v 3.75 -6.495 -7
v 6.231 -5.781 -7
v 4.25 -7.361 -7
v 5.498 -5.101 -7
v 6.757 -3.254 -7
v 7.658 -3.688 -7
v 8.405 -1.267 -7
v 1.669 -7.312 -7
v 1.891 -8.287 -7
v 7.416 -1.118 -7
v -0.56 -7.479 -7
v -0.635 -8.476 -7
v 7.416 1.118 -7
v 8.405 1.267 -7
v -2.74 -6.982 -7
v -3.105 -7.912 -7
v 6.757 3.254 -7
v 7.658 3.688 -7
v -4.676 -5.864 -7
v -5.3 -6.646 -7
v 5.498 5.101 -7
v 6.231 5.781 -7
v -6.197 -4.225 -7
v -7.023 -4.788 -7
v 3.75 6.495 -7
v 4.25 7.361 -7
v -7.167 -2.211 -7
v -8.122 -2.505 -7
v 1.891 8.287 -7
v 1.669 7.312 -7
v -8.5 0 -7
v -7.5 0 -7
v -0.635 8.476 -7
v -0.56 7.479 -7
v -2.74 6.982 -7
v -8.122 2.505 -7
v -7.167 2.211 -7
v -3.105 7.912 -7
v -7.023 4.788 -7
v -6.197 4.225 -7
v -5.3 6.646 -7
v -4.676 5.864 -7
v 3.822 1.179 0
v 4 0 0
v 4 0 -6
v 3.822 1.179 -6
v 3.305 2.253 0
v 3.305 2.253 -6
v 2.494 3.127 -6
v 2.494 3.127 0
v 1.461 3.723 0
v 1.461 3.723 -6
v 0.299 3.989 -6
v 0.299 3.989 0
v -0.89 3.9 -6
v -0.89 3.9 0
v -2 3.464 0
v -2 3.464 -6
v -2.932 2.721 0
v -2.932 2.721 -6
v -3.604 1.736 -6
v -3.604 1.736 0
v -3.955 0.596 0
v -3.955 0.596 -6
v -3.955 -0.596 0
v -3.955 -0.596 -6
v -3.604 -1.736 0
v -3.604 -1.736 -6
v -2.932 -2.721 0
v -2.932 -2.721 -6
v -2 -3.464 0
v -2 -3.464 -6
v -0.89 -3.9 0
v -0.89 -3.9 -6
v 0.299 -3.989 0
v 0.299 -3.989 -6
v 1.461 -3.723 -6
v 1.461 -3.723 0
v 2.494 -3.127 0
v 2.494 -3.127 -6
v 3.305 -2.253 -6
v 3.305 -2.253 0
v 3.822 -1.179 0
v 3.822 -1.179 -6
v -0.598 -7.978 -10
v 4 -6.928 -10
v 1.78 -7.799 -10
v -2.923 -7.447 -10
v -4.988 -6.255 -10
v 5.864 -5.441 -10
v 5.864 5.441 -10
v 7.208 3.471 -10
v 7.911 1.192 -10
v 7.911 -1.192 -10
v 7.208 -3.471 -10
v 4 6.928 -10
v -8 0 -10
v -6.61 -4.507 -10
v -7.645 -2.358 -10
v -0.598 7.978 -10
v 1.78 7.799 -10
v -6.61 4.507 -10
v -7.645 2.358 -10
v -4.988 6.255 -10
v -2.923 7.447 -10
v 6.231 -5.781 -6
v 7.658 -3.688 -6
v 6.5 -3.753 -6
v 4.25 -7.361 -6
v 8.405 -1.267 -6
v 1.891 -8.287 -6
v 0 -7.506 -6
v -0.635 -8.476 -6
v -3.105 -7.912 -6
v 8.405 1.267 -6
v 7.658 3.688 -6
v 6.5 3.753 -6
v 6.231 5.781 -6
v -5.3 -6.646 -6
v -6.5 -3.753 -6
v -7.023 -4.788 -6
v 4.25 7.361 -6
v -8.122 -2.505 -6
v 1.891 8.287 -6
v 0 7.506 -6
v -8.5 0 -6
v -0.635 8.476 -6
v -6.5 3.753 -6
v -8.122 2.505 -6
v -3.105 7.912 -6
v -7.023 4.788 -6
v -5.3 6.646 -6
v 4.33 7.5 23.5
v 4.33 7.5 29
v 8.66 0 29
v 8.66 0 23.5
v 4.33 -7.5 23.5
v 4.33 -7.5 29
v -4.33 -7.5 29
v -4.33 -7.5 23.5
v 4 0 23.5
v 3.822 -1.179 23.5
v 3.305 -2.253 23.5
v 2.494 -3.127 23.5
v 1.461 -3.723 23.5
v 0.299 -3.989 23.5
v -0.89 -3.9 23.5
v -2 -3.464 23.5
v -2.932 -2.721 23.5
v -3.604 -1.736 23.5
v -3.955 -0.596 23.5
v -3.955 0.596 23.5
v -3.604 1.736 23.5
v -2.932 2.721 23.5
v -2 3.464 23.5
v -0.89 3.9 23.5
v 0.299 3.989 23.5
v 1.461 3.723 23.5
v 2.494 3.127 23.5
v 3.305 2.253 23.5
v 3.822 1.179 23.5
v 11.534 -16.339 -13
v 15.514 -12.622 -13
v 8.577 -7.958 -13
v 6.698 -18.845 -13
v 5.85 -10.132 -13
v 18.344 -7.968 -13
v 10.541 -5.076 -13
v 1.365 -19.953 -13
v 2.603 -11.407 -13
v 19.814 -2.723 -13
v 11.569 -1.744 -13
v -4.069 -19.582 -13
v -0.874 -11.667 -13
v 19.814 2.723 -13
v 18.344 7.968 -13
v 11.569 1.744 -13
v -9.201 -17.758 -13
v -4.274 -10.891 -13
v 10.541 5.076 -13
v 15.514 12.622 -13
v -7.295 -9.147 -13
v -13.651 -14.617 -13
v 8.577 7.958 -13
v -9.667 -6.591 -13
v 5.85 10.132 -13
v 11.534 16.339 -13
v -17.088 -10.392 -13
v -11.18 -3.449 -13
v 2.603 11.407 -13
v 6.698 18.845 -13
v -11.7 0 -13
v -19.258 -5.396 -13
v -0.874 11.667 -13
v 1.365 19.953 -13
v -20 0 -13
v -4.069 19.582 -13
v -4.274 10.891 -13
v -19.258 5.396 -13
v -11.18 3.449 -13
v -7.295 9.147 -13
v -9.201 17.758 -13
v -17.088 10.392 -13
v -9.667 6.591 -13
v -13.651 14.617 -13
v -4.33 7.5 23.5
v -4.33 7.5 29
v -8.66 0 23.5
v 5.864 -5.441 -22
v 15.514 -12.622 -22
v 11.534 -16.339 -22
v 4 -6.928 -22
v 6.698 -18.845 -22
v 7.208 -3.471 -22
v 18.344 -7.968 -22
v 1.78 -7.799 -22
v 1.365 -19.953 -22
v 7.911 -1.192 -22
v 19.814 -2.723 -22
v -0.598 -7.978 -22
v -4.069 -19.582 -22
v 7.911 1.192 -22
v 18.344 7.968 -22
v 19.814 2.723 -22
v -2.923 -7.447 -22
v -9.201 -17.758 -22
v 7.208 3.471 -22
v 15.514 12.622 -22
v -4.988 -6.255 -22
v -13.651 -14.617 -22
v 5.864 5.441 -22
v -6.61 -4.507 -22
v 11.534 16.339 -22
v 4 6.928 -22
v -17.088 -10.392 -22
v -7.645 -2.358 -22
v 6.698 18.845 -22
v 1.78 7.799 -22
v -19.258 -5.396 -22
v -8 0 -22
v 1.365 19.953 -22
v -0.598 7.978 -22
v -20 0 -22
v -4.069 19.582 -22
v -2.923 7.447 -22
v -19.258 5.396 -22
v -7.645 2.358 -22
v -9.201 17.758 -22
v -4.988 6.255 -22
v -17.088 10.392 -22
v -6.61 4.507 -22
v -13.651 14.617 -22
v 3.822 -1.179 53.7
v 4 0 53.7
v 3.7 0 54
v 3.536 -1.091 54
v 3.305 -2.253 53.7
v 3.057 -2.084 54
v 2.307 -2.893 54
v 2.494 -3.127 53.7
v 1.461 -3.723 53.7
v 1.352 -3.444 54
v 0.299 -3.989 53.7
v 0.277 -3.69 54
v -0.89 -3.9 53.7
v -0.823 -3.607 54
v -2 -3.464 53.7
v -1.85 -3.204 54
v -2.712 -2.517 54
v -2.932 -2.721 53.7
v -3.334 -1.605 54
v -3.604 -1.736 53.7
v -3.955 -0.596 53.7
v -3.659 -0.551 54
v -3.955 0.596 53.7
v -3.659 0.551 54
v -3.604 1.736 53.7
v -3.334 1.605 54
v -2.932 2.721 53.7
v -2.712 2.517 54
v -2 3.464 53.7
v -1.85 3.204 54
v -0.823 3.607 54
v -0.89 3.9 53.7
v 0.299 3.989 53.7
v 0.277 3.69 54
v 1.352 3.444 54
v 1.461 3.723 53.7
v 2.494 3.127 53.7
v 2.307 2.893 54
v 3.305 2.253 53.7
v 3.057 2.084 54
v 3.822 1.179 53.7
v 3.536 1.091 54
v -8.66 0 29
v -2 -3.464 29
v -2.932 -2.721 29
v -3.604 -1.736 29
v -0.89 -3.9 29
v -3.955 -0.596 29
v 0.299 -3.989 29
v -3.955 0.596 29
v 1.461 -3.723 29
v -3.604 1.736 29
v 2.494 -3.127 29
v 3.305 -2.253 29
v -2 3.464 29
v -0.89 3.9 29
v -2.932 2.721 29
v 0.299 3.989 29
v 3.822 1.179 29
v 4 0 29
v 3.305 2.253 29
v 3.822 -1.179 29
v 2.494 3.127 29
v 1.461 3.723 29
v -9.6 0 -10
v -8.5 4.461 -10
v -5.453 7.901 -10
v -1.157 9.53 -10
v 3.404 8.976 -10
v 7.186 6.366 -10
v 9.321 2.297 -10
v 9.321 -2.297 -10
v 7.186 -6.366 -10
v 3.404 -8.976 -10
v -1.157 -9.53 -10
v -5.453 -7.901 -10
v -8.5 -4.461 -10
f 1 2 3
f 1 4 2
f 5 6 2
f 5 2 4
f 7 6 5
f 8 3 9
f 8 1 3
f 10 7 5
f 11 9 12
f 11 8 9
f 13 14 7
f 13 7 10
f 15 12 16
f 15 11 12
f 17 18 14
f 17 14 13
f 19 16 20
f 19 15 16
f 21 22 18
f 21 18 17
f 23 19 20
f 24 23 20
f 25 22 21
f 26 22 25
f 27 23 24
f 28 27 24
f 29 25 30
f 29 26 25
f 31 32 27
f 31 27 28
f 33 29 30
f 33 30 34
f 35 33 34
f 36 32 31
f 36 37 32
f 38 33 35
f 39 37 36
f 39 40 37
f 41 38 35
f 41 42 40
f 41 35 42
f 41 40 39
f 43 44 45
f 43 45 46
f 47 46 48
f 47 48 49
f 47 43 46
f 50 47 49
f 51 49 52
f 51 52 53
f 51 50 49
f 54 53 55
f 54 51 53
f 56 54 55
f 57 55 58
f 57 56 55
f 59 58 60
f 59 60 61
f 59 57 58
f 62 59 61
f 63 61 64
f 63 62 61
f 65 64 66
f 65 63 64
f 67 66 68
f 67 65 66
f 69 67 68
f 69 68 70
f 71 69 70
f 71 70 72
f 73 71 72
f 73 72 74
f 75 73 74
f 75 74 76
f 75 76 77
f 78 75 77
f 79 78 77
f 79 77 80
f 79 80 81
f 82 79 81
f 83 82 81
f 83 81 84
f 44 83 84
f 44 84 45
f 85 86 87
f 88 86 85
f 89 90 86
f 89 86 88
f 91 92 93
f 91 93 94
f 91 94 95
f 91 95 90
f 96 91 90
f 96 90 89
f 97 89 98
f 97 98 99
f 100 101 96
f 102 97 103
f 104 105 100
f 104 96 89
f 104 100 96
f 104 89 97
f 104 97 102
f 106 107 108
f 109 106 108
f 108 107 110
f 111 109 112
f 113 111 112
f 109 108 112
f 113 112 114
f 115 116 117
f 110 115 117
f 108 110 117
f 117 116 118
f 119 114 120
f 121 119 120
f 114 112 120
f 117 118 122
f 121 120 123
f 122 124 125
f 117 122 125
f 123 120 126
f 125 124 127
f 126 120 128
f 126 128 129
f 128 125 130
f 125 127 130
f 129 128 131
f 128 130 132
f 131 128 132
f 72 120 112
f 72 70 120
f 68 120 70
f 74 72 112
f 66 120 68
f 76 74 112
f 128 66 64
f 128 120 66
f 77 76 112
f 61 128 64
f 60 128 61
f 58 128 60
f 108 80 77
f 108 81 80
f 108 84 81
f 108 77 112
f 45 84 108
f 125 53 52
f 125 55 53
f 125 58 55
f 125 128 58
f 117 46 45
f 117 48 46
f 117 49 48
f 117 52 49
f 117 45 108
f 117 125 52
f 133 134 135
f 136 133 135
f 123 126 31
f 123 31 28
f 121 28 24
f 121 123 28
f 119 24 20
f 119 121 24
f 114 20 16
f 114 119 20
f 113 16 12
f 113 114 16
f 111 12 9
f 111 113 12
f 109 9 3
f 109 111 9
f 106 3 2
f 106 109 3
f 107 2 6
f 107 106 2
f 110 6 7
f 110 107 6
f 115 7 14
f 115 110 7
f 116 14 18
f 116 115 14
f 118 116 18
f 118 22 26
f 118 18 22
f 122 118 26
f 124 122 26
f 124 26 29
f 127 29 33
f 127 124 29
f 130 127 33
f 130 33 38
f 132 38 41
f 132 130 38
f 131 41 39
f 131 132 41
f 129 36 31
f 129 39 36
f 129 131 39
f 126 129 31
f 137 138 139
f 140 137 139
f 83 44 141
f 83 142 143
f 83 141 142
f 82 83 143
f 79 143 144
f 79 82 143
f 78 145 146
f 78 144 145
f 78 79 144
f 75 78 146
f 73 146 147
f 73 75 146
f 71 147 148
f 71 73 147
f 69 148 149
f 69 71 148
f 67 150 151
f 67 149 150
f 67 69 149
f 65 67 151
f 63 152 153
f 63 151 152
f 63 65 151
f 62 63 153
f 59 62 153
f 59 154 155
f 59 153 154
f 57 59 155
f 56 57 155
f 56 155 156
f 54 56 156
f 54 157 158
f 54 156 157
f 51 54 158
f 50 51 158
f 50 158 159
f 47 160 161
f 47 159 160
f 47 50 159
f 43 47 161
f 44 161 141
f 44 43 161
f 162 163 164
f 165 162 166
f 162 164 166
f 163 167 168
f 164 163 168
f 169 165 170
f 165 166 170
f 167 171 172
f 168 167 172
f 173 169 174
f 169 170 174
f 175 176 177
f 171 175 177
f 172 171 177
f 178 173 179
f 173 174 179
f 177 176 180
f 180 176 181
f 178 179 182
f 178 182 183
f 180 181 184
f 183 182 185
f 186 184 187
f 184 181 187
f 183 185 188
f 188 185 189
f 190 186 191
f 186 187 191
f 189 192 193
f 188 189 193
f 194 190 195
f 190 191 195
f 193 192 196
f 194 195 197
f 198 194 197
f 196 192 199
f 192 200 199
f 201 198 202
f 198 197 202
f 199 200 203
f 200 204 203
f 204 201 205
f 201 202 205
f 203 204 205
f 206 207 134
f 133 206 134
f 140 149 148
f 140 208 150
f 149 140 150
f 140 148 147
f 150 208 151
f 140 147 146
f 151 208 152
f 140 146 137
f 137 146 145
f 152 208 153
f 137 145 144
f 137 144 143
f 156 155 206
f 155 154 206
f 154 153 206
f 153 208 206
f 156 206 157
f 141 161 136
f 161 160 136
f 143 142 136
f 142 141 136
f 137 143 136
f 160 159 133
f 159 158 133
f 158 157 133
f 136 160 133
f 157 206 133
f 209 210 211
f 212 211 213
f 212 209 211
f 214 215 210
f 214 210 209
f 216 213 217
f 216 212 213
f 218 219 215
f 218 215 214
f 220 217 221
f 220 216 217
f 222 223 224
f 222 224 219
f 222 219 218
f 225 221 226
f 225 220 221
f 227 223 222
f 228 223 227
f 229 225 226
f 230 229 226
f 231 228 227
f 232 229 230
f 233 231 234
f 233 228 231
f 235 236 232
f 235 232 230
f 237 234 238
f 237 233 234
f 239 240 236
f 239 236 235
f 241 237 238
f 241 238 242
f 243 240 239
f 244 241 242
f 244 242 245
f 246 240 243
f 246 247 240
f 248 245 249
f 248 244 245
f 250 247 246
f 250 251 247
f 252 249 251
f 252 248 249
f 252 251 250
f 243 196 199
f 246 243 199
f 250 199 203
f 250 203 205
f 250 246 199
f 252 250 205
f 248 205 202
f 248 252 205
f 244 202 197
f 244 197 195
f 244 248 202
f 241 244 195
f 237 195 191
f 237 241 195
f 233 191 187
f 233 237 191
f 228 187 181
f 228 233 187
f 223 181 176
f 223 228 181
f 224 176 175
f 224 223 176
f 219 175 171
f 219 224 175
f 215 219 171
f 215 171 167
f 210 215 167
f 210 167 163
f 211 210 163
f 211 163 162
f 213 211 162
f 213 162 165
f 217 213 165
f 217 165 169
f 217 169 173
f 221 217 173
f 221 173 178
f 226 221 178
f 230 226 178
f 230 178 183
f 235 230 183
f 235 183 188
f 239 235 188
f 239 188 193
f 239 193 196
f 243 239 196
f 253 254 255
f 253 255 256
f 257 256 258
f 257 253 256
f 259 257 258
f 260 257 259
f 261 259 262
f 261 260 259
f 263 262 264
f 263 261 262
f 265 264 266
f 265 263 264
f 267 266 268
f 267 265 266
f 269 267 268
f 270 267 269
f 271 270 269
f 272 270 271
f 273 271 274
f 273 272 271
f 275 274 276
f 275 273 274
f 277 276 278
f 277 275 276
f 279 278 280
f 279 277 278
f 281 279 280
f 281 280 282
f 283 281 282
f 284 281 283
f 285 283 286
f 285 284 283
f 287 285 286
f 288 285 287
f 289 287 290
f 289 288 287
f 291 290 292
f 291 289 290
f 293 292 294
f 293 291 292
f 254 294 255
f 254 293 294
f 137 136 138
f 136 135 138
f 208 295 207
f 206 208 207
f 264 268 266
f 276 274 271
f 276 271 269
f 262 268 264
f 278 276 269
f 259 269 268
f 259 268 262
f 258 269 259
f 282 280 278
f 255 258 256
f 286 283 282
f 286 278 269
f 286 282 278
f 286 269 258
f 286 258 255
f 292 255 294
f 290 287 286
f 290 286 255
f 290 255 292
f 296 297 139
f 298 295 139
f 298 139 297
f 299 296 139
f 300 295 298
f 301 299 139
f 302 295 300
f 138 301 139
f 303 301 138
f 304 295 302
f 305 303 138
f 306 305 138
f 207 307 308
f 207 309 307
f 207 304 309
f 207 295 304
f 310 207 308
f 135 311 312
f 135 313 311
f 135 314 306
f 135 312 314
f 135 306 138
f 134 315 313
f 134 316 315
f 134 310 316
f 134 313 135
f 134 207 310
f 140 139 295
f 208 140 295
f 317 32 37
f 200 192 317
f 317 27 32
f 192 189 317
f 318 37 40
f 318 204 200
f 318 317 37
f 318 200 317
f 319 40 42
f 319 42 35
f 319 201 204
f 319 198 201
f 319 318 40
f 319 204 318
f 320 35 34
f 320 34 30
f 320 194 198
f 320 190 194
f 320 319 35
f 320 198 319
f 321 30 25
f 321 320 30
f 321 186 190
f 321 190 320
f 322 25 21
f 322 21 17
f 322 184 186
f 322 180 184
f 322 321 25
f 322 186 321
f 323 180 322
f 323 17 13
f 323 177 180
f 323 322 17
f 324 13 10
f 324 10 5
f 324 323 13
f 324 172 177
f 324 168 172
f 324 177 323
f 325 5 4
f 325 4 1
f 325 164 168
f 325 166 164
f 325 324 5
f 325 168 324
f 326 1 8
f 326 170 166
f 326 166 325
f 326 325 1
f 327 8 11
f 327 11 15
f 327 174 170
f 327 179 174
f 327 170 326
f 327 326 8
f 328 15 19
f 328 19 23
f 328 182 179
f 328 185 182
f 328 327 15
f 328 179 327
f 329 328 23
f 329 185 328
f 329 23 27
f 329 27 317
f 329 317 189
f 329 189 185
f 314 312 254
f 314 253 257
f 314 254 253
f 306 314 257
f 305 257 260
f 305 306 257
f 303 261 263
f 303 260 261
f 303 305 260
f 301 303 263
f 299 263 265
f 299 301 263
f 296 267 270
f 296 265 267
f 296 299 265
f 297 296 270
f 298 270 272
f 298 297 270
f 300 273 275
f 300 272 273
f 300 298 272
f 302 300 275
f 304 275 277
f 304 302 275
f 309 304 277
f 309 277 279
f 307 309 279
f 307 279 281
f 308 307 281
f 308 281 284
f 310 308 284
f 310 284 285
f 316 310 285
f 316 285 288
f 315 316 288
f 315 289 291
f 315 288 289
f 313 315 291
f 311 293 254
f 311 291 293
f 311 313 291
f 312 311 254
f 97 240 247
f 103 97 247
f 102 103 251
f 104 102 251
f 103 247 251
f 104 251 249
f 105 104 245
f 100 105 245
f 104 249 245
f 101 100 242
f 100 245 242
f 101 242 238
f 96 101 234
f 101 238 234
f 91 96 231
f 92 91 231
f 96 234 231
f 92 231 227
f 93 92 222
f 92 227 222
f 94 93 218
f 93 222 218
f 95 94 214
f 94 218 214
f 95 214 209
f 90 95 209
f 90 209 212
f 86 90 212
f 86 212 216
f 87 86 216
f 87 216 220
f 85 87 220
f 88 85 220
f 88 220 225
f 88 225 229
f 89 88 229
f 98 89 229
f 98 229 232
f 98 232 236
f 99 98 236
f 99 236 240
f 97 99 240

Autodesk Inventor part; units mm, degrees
ref_plane "YZ Plane" through (0, 0, 0) normal (1, 0, 0) x (0, 1, 0)
sketch "Sketch1" plane through (0, 0, 0) normal (0, 0, 1) x (1, 0, 0)
  circle A0 centre (0, 0) radius 4
  dimension "d0" = 8
extrude "Extrusion1" add sketch "Sketch1" along normal blind 54
sketch "Sketch2" plane through (0, 0, 0) normal (0, 0, -1) x (-1, 0, 0)
  line L0 (0, 7.5056) -> (6.5, 3.7528)
  line L1 (6.5, 3.7528) -> (6.5, -3.7528)
  line L2 (6.5, -3.7528) -> (0, -7.5056)
  line L3 (0, -7.5056) -> (-6.5, -3.7528)
  line L4 (-6.5, -3.7528) -> (-6.5, 3.7528)
  line L5 (-6.5, 3.7528) -> (0, 7.5056)
  point P0 (0, 0)
  point P1 (0, 0)
  dimension "d3" = 13
  dimension "d4" = 6.5
extrude "Extrusion2" add sketch "Sketch2" along normal blind 6
sketch "Sketch3" plane through (0, 0, -6) normal (0, 0, -1) x (-1, 0, 0)
  circle A0 centre (0, 0) radius 8.5
  dimension "d7" = 17
extrude "Extrusion3" add sketch "Sketch3" along normal blind 1
sketch "Sketch4" plane through (0, 0, -7) normal (0, 0, -1) x (-1, 0, 0)
  circle A0 centre (0, 0) radius 7.5
  dimension "d10" = 15
ref_plane "Work Plane1" through (0, 0, -17) normal (0, 0, -1) x (-1, 0, 0)
sketch "Sketch5" plane through (0, 0, -17) normal (0, 0, -1) x (-1, 0, 0)
  circle A0 centre (0, 0) radius 14.5
  dimension "d12" = 29
loft "Loft1" add profiles "Sketch4", "Sketch5"
sketch "Sketch6" plane through (0, 0, -17) normal (0, 0, -1) x (-1, 0, 0)
  circle A0 centre (0, 0) radius 17
  dimension "d17" = 34
extrude "Extrusion4" add sketch "Sketch6" against normal blind 2
chamfer "Chamfer1" distance 0.3 angle 45 1 edges at (-4, 0, 54)
sketch "Sketch7" plane through (0, 0, -17) normal (0, 0, -1) x (-1, 0, 0)
  circle A0 centre (0, 0) radius 4 projected
  circle A1 centre (0, 0) radius 20
  dimension "d26" = 40
extrude "Extrusion5" add sketch "Sketch7" against normal blind 4 and the other way blind 5
sketch "Sketch8" plane through (0, 0, -22) normal (0, 0, -1) x (-1, 0, 0)
  circle A0 centre (0, 0) radius 8
  dimension "d31" = 16
extrude "Extrusion6" cut sketch "Sketch8" against normal blind 12
sketch "Sketch9" plane through (0, 0, 0) normal (0, 0, 1) x (1, 0, 0)
  line L0 (0, 7.5056) -> (-6.5, 3.7528) projected
  line L1 (-6.5, 3.7528) -> (-6.5, -3.7528) projected
  line L2 (-6.5, -3.7528) -> (0, -7.5056) projected
  line L3 (0, -7.5056) -> (6.5, -3.7528) projected
  line L4 (6.5, -3.7528) -> (6.5, 3.7528) projected
  line L5 (6.5, 3.7528) -> (0, 7.5056) projected
  circle A0 centre (0, 0) radius 4 projected
extrude "Extrusion7" cut sketch "Sketch9" against normal up to surface (6 mm away)
ref_plane "Work Plane2" through (0, 0, 29) normal (0, 0, 1) x (1, 0, 0)
sketch "Sketch10" plane through (0, 0, 29) normal (0, 0, 1) x (1, 0, 0)
  circle A0 centre (0, 0) radius 4 projected
  line L0 (8.6603, 0) -> (4.3301, -7.5)
  line L1 (4.3301, -7.5) -> (-4.3301, -7.5)
  line L2 (-4.3301, -7.5) -> (-8.6603, 0)
  line L3 (-8.6603, 0) -> (-4.3301, 7.5)
  line L4 (-4.3301, 7.5) -> (4.3301, 7.5)
  line L5 (4.3301, 7.5) -> (8.6603, 0)
  dimension "d37" = 15
  dimension "d38" = 8.6602
  dimension "d39" = 8.6602
extrude "Extrusion8" add sketch "Sketch10" against normal blind 5.5
thread "Thread2" size "M8x1.25" class "6g" standard "ISO Metric profile" full length
thread "Thread3" size "M10x1.5" class "6g" standard "ANSI Metric M Profile" full length
equation "\"d4\" = 0.5 * d3"
properties part number "Adjuster Pad" material "Stainless Steel"
